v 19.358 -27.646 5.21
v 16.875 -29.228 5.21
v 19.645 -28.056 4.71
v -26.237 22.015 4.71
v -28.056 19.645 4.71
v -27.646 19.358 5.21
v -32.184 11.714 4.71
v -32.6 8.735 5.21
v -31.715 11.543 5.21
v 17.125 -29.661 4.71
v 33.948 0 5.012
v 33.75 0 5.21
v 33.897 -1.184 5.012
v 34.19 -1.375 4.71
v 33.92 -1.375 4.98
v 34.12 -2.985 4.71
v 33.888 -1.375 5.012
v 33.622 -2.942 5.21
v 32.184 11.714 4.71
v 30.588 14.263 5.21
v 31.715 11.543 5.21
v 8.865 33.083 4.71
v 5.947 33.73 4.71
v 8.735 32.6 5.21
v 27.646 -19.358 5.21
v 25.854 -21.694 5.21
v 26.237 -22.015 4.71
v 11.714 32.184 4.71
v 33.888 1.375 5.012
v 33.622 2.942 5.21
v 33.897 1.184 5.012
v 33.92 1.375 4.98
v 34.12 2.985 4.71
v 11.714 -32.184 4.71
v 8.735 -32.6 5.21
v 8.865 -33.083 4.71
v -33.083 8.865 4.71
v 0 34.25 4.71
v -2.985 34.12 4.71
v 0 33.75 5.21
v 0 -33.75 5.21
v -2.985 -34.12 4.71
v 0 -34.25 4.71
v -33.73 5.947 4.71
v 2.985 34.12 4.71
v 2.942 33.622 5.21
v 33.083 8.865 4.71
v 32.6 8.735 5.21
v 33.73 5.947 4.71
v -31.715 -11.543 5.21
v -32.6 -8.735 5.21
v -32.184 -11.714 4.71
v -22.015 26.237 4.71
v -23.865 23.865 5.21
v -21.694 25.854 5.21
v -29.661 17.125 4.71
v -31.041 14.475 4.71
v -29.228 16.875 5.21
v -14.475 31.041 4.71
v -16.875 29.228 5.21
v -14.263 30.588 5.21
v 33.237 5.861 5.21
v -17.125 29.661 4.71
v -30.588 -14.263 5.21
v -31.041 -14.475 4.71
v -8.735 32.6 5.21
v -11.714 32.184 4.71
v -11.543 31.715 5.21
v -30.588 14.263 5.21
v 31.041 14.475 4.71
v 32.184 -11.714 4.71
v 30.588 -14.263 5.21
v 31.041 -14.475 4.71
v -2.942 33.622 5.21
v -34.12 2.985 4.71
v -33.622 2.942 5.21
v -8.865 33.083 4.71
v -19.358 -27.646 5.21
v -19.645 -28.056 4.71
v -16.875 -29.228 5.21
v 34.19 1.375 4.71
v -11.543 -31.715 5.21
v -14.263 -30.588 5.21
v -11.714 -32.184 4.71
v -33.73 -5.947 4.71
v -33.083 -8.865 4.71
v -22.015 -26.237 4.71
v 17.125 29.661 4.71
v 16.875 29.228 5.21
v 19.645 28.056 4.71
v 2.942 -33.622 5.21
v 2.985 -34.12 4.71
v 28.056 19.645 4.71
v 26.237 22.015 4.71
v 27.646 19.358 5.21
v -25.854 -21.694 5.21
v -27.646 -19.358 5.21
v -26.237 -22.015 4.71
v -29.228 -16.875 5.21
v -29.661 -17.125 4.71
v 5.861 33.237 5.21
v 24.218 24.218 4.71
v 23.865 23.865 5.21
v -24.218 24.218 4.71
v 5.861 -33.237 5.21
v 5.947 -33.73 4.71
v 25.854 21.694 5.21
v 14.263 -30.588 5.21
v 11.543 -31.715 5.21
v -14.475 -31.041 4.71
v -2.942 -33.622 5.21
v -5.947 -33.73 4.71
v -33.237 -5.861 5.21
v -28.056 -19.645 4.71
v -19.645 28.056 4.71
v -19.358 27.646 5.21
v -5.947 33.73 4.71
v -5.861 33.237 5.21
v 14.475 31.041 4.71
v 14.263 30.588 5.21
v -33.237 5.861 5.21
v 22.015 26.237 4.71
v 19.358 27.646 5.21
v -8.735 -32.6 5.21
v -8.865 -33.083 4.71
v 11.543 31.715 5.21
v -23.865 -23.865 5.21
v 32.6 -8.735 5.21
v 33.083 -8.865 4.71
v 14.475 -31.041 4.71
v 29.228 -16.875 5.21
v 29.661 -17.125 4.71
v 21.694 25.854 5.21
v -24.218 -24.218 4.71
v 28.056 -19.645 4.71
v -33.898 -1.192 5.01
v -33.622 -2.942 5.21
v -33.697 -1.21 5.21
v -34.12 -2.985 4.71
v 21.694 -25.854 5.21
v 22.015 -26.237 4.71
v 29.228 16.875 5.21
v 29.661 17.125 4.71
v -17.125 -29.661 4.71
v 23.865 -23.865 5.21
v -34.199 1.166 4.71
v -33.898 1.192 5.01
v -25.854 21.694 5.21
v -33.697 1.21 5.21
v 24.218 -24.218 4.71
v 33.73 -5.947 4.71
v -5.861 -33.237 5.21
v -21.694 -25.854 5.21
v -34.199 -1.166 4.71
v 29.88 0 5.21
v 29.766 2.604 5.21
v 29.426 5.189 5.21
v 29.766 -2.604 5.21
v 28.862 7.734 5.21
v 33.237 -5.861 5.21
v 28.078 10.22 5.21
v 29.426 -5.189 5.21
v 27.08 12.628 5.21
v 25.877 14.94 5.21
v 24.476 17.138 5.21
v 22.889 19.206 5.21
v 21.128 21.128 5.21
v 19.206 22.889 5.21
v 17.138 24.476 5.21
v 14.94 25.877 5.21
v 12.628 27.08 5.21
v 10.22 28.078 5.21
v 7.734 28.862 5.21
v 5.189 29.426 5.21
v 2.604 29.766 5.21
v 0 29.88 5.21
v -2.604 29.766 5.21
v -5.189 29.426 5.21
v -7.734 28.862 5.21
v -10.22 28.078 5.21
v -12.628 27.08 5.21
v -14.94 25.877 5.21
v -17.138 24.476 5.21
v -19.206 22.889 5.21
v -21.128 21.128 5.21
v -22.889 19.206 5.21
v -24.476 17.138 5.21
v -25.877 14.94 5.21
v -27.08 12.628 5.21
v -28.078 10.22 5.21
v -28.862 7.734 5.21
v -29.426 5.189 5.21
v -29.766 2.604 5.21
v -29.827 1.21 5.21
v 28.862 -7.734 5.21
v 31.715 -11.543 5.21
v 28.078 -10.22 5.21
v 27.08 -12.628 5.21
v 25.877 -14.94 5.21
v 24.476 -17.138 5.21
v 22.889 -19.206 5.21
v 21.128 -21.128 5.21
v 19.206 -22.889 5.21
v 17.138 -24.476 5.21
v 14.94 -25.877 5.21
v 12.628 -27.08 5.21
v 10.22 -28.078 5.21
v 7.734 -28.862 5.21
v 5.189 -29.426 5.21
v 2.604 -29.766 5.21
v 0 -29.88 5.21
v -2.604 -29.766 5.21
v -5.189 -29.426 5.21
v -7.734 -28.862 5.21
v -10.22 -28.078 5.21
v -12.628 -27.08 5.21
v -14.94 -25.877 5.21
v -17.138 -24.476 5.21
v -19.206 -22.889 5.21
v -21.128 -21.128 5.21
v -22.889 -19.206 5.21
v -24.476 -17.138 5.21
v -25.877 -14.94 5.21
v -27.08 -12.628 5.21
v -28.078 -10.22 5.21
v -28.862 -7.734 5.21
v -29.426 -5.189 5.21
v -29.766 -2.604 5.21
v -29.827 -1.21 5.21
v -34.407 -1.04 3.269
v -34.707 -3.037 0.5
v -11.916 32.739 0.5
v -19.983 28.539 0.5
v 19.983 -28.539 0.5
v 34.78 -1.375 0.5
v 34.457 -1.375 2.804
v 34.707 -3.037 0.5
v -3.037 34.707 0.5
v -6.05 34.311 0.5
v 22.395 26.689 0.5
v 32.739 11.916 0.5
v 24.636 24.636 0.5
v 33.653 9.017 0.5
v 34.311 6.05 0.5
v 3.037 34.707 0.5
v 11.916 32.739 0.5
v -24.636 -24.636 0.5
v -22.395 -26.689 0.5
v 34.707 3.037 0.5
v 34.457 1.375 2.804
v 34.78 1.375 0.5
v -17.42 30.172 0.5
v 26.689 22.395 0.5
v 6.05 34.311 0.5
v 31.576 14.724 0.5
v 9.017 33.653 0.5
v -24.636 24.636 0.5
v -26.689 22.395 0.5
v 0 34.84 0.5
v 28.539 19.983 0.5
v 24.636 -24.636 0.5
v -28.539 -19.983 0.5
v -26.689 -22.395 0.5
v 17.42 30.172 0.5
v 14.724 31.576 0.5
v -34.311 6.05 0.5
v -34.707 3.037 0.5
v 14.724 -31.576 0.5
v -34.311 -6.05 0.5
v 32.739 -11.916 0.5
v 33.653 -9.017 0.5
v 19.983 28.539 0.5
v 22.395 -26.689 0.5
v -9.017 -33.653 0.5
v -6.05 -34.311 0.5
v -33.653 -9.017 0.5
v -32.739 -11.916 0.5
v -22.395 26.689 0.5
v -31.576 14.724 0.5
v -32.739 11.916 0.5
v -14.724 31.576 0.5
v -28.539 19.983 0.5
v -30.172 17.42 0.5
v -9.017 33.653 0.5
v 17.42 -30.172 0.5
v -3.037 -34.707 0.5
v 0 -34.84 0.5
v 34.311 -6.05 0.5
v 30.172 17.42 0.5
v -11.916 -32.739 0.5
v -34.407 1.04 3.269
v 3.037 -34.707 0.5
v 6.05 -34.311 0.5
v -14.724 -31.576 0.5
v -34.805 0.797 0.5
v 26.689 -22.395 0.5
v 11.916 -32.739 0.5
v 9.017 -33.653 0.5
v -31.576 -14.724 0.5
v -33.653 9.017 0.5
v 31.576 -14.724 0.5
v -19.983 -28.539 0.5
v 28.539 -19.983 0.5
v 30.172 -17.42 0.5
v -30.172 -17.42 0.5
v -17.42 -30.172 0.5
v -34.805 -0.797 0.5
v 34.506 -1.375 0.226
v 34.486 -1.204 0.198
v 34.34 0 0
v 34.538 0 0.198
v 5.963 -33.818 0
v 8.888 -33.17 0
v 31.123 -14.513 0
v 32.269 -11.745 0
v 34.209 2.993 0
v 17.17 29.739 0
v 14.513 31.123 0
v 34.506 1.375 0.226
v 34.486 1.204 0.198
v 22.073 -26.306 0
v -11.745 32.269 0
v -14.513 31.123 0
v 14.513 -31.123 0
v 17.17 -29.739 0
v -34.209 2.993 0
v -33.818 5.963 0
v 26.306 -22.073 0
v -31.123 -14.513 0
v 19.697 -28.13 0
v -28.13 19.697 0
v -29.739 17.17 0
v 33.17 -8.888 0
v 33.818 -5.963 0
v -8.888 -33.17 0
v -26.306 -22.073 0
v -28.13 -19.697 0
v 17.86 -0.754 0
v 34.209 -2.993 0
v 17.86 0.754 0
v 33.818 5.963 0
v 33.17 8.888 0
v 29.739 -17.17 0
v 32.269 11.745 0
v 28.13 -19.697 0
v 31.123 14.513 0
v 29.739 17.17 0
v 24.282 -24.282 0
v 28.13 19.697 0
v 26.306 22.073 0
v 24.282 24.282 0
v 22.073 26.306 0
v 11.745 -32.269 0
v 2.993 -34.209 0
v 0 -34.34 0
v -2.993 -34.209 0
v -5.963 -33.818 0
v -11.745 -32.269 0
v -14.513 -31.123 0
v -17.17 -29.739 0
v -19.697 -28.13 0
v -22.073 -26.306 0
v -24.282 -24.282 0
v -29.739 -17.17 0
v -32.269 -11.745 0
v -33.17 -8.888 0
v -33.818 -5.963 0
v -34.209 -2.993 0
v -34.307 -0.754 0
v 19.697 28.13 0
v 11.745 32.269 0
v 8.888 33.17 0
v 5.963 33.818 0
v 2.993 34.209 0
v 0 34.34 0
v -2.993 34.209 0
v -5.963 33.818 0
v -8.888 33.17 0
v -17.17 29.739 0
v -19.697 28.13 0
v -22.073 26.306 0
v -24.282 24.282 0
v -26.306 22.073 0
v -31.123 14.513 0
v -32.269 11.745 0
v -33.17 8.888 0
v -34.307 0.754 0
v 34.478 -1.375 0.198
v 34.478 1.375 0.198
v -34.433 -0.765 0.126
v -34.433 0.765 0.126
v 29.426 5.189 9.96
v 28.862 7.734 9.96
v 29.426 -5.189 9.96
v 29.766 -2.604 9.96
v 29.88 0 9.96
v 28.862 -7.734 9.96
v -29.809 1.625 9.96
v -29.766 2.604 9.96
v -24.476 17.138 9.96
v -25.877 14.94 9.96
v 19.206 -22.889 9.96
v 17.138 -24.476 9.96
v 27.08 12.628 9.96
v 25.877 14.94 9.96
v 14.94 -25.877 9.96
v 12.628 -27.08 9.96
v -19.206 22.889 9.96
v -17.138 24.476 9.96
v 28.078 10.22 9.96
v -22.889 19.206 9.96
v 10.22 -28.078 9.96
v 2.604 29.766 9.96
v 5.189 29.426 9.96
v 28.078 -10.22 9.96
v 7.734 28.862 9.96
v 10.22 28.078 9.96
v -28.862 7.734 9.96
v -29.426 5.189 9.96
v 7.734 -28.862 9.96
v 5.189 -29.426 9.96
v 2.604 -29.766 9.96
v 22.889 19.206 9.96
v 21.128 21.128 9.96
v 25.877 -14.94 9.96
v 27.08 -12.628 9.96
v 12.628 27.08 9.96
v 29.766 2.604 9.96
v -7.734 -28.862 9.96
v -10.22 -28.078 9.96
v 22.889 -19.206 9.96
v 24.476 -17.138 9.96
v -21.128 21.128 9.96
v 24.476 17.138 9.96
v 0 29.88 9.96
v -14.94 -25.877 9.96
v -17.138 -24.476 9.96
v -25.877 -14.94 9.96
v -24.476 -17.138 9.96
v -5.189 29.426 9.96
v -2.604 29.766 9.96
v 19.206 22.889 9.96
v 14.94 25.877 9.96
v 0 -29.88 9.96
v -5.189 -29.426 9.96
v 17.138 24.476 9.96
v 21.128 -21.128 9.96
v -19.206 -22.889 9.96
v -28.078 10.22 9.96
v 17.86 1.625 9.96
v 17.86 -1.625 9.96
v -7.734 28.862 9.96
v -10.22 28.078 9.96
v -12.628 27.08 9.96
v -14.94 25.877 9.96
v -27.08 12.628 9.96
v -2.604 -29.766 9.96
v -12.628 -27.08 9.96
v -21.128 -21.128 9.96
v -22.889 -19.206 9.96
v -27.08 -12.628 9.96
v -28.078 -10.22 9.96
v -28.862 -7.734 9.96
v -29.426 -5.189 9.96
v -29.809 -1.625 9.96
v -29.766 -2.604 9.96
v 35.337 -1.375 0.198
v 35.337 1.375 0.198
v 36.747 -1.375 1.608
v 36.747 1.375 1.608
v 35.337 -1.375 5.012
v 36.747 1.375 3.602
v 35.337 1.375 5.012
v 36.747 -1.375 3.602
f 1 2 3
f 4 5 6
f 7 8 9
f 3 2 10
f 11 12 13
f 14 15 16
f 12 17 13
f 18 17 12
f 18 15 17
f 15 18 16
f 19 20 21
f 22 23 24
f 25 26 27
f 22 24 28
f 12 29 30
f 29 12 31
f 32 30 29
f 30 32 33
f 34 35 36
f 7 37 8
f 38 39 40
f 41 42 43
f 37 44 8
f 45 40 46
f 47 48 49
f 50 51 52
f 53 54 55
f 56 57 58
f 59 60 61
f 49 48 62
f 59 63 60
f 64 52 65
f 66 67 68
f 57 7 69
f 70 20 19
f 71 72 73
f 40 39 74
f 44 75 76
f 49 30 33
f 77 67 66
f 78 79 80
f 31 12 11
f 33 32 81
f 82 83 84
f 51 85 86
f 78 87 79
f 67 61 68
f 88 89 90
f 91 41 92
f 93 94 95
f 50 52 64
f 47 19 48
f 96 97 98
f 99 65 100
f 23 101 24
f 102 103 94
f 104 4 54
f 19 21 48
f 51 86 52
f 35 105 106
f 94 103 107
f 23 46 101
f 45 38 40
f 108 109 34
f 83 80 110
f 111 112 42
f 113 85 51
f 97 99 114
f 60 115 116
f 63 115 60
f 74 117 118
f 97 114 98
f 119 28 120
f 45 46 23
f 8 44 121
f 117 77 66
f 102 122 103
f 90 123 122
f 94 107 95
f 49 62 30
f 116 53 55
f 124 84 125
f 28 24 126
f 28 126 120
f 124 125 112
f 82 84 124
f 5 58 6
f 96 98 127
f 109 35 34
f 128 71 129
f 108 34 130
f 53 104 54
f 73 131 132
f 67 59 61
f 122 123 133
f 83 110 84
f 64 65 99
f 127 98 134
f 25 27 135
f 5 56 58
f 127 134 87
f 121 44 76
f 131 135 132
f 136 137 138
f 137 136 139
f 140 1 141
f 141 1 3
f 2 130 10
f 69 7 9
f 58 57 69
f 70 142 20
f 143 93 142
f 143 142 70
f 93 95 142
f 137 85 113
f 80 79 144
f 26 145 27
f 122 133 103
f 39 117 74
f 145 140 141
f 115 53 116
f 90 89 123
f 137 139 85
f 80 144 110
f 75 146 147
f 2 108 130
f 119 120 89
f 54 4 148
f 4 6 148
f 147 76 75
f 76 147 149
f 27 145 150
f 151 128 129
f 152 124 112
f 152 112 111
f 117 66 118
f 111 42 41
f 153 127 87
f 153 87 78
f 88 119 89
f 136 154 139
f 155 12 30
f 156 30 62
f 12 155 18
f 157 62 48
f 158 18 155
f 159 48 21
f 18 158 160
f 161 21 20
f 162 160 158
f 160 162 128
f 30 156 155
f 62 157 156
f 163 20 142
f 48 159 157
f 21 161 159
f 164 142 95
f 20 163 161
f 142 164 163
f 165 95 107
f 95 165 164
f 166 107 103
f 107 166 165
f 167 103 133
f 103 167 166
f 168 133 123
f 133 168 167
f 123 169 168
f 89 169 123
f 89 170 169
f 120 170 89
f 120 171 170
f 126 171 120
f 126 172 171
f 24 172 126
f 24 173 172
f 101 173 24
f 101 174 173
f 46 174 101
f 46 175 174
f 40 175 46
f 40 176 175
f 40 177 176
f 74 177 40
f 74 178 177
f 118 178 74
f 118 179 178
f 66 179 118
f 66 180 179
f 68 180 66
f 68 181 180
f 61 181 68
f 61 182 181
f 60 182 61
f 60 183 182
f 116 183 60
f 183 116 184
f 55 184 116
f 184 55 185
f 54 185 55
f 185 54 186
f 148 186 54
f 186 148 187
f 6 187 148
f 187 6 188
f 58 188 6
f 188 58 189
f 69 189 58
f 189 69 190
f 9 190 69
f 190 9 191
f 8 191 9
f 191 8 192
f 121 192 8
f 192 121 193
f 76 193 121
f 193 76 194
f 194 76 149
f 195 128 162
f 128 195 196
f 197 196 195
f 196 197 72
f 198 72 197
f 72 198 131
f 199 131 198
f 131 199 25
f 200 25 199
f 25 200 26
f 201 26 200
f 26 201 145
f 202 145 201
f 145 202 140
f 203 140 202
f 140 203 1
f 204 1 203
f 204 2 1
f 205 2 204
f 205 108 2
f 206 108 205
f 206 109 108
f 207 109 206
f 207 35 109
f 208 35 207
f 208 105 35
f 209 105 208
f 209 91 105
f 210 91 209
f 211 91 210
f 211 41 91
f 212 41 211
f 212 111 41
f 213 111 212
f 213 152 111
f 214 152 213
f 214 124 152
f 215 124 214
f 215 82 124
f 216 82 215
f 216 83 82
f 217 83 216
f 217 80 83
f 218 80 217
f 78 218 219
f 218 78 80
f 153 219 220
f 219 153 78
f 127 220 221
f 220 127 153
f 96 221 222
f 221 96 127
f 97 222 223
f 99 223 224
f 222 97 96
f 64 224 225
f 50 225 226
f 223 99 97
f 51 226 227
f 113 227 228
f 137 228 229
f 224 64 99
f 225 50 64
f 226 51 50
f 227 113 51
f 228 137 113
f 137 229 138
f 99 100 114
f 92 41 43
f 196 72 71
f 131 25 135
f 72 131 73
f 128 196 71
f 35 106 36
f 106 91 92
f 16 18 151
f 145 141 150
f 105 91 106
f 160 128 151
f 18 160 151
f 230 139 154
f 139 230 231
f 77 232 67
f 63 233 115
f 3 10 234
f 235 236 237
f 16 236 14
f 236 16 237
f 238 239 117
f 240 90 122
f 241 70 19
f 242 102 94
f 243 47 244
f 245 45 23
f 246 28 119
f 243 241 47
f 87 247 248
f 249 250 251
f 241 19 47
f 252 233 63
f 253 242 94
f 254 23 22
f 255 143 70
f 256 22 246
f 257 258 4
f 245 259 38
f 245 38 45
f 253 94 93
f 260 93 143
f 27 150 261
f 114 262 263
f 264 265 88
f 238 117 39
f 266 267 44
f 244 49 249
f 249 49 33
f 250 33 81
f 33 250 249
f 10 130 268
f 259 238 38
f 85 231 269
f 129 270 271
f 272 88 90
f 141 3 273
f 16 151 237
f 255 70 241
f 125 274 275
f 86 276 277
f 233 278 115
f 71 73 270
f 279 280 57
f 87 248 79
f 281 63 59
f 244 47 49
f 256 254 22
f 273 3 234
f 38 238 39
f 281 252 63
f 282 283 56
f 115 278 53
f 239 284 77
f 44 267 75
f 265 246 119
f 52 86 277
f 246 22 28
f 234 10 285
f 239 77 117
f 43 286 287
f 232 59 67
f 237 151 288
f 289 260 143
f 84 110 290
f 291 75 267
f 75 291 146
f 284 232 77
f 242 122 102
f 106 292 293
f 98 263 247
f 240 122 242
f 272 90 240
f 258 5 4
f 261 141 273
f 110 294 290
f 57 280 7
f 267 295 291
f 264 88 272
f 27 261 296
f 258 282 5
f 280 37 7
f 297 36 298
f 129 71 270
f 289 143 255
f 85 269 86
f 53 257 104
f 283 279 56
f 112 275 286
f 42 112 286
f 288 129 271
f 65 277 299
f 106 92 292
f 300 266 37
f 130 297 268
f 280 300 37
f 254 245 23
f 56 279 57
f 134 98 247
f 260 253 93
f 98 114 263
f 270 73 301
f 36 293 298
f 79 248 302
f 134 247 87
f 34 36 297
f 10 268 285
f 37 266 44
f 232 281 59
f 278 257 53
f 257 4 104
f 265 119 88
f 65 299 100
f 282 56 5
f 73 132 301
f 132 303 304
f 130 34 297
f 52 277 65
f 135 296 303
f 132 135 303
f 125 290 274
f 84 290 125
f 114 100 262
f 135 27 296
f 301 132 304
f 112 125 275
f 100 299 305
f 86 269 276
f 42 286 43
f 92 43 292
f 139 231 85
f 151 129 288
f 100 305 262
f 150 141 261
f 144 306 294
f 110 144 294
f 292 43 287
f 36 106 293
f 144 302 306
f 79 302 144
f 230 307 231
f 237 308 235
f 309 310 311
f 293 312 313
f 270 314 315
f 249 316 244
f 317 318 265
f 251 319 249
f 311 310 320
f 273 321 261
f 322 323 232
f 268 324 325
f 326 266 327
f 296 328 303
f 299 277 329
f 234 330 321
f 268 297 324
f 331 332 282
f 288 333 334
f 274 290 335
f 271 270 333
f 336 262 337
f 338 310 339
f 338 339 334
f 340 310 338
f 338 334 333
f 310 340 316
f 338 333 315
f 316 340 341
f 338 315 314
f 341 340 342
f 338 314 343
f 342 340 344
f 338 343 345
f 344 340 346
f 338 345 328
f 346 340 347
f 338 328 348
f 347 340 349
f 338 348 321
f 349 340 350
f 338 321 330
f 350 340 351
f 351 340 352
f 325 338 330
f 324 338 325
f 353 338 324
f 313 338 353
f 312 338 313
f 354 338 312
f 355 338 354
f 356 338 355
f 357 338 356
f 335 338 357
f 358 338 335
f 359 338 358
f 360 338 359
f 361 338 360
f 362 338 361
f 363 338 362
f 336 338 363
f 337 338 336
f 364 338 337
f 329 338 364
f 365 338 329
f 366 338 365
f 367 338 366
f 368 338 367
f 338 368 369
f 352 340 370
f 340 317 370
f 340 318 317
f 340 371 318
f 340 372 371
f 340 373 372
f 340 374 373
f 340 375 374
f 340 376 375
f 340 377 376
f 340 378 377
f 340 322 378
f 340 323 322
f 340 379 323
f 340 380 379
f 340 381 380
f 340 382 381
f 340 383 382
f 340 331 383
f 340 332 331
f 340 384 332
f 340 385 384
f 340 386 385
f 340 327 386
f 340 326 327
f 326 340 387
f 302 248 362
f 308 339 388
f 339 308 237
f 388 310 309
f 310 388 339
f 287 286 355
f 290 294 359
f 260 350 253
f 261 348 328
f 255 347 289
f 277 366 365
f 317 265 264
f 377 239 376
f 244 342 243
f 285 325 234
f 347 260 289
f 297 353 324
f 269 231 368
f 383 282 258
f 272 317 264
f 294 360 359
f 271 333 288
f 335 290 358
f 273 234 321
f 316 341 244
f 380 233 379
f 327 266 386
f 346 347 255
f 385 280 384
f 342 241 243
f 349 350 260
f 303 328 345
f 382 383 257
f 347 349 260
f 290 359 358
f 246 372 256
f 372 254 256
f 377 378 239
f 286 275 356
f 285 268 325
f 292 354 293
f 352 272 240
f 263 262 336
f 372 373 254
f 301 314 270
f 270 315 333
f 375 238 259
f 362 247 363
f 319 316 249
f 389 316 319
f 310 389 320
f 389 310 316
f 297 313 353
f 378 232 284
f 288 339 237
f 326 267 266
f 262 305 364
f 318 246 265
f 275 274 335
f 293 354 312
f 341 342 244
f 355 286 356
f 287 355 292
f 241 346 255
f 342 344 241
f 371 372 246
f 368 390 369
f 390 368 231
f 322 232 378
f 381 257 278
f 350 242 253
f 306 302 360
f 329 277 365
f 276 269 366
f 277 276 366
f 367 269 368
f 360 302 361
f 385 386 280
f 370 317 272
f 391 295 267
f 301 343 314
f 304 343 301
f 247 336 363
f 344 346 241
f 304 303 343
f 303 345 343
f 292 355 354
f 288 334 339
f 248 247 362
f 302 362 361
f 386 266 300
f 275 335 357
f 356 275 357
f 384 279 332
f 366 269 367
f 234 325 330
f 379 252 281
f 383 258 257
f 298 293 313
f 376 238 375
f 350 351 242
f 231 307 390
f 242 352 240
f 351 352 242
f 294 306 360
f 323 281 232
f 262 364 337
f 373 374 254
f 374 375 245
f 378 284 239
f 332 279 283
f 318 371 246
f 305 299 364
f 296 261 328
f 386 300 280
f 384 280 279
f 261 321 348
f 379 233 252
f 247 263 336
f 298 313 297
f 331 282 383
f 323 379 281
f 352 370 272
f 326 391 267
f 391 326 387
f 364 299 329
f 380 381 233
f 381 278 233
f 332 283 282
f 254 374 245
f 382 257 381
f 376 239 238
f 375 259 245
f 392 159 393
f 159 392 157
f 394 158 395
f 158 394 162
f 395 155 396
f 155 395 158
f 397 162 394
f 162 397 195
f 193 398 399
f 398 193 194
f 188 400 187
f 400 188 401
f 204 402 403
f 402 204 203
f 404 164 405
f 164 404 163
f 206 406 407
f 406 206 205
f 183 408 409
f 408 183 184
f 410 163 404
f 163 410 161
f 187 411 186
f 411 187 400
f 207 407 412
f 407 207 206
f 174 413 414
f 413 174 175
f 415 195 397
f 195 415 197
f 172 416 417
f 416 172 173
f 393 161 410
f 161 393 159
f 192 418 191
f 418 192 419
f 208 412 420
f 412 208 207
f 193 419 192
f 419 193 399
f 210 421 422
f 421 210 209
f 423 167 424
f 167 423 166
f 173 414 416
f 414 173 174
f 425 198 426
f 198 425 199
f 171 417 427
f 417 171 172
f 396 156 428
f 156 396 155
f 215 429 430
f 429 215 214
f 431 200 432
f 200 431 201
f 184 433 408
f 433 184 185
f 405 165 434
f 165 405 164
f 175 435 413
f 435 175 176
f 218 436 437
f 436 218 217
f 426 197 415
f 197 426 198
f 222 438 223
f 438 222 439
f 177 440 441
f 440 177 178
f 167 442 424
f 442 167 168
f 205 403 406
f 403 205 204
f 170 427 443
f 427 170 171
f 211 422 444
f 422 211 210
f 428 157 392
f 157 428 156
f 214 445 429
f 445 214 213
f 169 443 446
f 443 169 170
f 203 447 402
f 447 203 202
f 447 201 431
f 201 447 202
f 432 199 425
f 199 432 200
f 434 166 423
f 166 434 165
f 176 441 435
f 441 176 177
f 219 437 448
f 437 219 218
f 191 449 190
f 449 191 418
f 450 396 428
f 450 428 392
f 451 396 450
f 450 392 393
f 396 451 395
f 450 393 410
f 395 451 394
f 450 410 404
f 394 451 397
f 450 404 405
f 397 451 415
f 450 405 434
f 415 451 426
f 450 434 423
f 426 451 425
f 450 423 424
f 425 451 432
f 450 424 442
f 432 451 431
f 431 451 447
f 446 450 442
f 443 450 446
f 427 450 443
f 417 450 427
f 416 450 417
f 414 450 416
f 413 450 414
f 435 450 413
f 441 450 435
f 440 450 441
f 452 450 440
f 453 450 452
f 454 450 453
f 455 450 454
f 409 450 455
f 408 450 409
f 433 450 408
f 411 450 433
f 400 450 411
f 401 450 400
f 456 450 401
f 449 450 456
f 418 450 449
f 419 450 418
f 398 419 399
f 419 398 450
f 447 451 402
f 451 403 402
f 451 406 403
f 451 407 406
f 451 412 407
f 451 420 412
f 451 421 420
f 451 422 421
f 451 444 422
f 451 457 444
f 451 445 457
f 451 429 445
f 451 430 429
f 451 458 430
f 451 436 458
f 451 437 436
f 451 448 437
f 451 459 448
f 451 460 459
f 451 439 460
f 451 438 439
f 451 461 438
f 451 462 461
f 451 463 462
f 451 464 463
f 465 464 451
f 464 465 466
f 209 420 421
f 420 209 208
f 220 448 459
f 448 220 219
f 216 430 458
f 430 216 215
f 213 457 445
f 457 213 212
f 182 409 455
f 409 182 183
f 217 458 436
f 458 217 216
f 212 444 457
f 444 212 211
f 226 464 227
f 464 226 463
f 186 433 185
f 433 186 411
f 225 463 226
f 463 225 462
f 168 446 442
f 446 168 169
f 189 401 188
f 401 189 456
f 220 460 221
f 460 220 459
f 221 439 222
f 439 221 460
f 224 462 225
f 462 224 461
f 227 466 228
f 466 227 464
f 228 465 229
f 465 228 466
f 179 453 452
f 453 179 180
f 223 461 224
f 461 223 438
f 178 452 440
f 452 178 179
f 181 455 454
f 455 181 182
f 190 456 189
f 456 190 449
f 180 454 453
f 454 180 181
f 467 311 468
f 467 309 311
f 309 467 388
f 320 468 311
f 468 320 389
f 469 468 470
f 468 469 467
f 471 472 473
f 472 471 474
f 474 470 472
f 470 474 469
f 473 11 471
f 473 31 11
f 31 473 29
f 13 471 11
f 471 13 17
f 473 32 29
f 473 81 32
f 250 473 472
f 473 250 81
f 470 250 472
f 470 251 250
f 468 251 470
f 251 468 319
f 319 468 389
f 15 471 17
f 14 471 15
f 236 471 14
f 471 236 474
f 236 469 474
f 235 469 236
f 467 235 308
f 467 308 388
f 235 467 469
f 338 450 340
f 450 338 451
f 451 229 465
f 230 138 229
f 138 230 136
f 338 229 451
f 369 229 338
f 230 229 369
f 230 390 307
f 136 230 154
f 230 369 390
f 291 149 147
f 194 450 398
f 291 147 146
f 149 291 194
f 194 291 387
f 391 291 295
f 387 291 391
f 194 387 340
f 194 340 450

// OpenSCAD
// A tool for creating custom saw inserts
//
// Lisenced under creative commons, attribution, share-alike
// For the attribution requirement, please provide a link to:
//	http://www.thingiverse.com/thing:1024418

// the units that all of the measurements below will be in
units=0; // [0:mm,1:inch]

// how big around the top of the insert is
top_d=69.68;

// how big around the top of the insert is (if zero, uses top_d)
bottom_d=68.5;

// size of a chamfer for the top (can be zero)
top_chamfer=0.5;

// size of a chamfer for the bottom (can be zero)
bottom_chamfer=0.5;

// the width of the blade slot (can be zero for no kerf)
kerf_width=1.5;

// how long to make the slot for the blade (can be zero for no kerf)
kerf_len=52.7;

// EXPERIMENTAL: tilt the kerf on each side so that dust falls out easier
kerf_crud_drainage=1; //[0:off,1:try it]

// how thick the insert is
thickness=5.21;

// how wide to make a key (fits into blade installation slot to keep insert from turning)  Can be zero.
key_width=2.75;

// What angle you want the key to be at
key_orientation=0; //[0,45,90,135,180,225,270,315]

// Add sub-support to drop even deeper (zero = no sub support)
sub_dia=59.76;

// Add sub-support to drop even deeper (zero = no sub support)
sub_thickness=4.75;

// flip upside-down for easier printing
print_orientation=1; // [0:view,1:print]

/* [hidden] */

units_table=[1,25.4];

function tomm(x)=x*units_table[units];

module doTheThing(){
	top_d=tomm(top_d);
	bottom_d=bottom_d<=0?top_d:tomm(bottom_d);
	top_chamfer=top_chamfer<=0?0.001:tomm(top_chamfer);
	bottom_chamfer=bottom_chamfer<=0?0.001:tomm(bottom_chamfer);
	kerf_width=tomm(kerf_width);
	kerf_len=tomm(kerf_len);
	thickness=tomm(thickness);
	key_width=tomm(key_width);
	sub_dia=tomm(sub_dia);
	sub_thickness=sub_dia<=0?0:tomm(sub_thickness);
	cd_angle=10;
	translate([0,0,print_orientation==1?thickness+sub_thickness:0]) rotate([print_orientation==1?180:0,0,0]) difference(){
		union(){
			// blank
			translate([0,0,sub_thickness]) cylinder(r1=bottom_d/2-bottom_chamfer,r2=bottom_d/2,h=bottom_chamfer,$fn=72);
			translate([0,0,sub_thickness+bottom_chamfer]) cylinder(r1=bottom_d/2,r2=top_d/2,h=thickness-bottom_chamfer-top_chamfer,$fn=72);
			translate([0,0,sub_thickness+thickness-bottom_chamfer]) cylinder(r1=top_d/2,r2=top_d/2-top_chamfer,h=top_chamfer,$fn=72);
			if(sub_thickness>0){
				cylinder(r=sub_dia/2,h=sub_thickness,$fn=72);
			}
			//key
			if(key_width>0){
				rotate([0,0,key_orientation]) translate([top_d/2-top_chamfer,key_width/2,thickness/2+sub_thickness]) rotate([90,0,0]) rotate([0,0,180/8]) cylinder(r=thickness/2,h=key_width,$fn=8);
			}
		}
		//kerf
		if(kerf_width>0&&kerf_len>0){
			if(kerf_crud_drainage==0){
				translate([-top_d/2-thickness,-kerf_width/2,-thickness/2]) cube([kerf_len+thickness,kerf_width,thickness*2+sub_thickness]);
			}else translate([-top_d/2-thickness,0,thickness+sub_thickness+0.01]) hull(){
				rotate([cd_angle/2,0,0]) translate([0,-kerf_width/2,-thickness*2-sub_thickness]) cube([kerf_len+thickness,kerf_width,thickness*2+sub_thickness]);
				rotate([-cd_angle/2,0,0]) translate([0,-kerf_width/2,-thickness*2-sub_thickness]) cube([kerf_len+thickness,kerf_width,thickness*2+sub_thickness]);
			}
		}
	}
}

doTheThing();
